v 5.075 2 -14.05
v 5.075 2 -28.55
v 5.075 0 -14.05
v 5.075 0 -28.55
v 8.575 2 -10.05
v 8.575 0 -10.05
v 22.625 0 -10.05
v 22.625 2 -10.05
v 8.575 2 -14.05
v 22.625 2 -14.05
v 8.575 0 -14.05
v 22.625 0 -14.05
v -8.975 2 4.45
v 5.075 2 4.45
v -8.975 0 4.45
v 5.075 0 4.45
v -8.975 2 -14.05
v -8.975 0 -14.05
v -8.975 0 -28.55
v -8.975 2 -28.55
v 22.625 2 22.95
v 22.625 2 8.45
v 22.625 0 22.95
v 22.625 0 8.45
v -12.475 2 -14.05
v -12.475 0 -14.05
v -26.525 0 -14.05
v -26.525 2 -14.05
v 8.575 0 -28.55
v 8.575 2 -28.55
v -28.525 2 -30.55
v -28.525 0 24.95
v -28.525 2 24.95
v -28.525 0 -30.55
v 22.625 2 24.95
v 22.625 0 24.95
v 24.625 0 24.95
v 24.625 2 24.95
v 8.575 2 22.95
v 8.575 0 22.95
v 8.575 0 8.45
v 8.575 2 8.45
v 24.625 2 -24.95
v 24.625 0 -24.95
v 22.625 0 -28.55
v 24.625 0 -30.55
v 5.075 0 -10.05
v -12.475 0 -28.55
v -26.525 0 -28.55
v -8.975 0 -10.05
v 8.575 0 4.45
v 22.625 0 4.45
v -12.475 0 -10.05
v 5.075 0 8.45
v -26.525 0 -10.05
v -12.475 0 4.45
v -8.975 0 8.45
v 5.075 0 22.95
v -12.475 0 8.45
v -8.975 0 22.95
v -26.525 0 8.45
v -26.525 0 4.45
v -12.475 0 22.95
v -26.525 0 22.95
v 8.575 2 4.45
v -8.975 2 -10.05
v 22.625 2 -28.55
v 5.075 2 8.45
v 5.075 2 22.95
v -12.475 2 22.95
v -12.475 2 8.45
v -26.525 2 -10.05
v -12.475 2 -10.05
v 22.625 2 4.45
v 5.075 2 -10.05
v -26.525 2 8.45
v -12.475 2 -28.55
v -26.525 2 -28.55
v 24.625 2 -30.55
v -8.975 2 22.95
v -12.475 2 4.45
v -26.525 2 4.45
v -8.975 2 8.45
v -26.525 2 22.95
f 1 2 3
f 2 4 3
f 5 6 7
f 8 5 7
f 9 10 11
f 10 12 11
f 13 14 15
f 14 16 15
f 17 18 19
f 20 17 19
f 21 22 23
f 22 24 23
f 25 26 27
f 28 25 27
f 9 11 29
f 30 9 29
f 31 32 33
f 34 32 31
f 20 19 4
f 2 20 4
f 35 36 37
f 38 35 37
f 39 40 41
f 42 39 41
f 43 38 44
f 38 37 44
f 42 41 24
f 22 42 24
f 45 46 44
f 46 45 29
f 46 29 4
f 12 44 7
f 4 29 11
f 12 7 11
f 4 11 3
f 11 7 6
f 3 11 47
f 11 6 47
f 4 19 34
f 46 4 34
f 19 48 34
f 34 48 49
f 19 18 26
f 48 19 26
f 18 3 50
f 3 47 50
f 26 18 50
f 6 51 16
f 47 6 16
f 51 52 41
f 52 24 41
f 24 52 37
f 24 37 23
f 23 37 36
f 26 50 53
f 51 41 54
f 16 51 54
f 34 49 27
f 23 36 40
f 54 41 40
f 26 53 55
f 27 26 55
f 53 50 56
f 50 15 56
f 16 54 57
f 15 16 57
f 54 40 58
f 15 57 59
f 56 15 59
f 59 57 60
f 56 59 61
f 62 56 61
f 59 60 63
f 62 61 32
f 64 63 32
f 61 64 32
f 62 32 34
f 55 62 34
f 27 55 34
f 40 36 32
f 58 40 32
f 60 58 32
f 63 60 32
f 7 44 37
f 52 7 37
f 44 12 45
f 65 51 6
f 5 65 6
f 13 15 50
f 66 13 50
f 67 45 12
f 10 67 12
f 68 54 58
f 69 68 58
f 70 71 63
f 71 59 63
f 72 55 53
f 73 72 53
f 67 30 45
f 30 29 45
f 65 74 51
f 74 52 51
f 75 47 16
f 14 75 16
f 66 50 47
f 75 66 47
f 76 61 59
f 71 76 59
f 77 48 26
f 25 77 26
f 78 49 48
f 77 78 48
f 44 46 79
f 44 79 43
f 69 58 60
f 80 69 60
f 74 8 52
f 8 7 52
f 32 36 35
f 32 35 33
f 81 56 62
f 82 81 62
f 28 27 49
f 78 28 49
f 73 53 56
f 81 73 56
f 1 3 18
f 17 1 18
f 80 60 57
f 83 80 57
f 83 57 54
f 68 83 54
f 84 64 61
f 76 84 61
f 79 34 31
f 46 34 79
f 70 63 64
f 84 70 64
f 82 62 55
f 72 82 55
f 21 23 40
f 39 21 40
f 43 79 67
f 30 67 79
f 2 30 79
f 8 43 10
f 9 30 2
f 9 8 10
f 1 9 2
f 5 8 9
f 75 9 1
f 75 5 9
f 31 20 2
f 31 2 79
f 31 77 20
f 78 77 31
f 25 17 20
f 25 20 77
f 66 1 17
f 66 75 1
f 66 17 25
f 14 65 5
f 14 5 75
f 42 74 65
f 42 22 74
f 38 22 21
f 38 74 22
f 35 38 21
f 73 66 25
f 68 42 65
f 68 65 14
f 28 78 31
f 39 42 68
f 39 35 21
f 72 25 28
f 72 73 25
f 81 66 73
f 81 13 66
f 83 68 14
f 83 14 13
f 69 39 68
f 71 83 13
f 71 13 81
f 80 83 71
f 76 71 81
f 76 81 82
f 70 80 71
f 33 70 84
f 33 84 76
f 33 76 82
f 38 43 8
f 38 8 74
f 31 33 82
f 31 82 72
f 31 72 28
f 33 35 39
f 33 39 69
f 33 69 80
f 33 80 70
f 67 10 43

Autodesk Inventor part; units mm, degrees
ref_plane "YZ Plane" through (0, 0, 0) normal (1, 0, 0) x (0, 1, 0)
ref_plane "XZ Plane" through (0, 0, 0) normal (0, 1, 0) x (-1, 0, 0)
ref_plane "XY Plane" through (0, 0, 0) normal (0, 0, 1) x (1, 0, 0)
sketch "Sketch1" plane through (0, 0, 0) normal (0, 1, 0) x (-1, 0, 0)
  line L0 (-24.625, 24.95) -> (-24.625, -24.95)
  line L1 (24.625, 24.95) -> (-24.625, -24.95) construction
  line L2 (-24.625, 24.95) -> (24.625, -24.95) construction
  line L3 (-24.625, 22.95) -> (-22.625, 22.95) construction
  line L4 (-22.625, 24.95) -> (-22.625, 22.95) construction
  line L5 (-22.625, 22.95) -> (-8.575, 22.95)
  line L6 (-8.575, 22.95) -> (-8.575, 8.45)
  line L7 (-8.575, 8.45) -> (-22.625, 8.45)
  line L8 (-22.625, 8.45) -> (-22.625, 22.95)
  line L9 (-22.625, 8.45) -> (-22.625, 4.45) construction
  line L10 (-22.625, 4.45) -> (-8.575, 4.45)
  line L11 (-8.575, 4.45) -> (-8.575, -10.05)
  line L12 (-8.575, -10.05) -> (-22.625, -10.05)
  line L13 (-22.625, -10.05) -> (-22.625, 4.45)
  line L14 (-22.625, -10.05) -> (-22.625, -14.05) construction
  line L15 (-22.625, -14.05) -> (-8.575, -14.05)
  line L16 (-8.575, -14.05) -> (-8.575, -28.55)
  line L17 (-8.575, -28.55) -> (-22.625, -28.55)
  line L18 (-22.625, -28.55) -> (-22.625, -14.05)
  line L19 (-8.575, 22.95) -> (-5.075, 22.95) construction
  line L20 (-5.075, 22.95) -> (8.975, 22.95)
  line L21 (8.975, 22.95) -> (8.975, 8.45)
  line L22 (8.975, 8.45) -> (-5.075, 8.45)
  line L23 (-5.075, 8.45) -> (-5.075, 22.95)
  line L24 (-5.075, 8.45) -> (-5.075, 4.45)
  line L25 (-5.075, 4.45) -> (8.975, 4.45)
  line L26 (8.975, 4.45) -> (8.975, -10.05)
  line L27 (8.975, -10.05) -> (-5.075, -10.05)
  line L28 (-5.075, -10.05) -> (-5.075, 4.45)
  line L29 (-5.075, -10.05) -> (-5.075, -14.05) construction
  line L30 (-5.075, -14.05) -> (8.975, -14.05)
  line L31 (8.975, -14.05) -> (8.975, -28.55)
  line L32 (8.975, -28.55) -> (-5.075, -28.55)
  line L33 (-5.075, -28.55) -> (-5.075, -14.05)
  line L34 (8.975, 22.95) -> (12.475, 22.95) construction
  line L35 (12.475, 22.95) -> (26.525, 22.95)
  line L36 (26.525, 22.95) -> (26.525, 8.45)
  line L37 (26.525, 8.45) -> (12.475, 8.45)
  line L38 (12.475, 8.45) -> (12.475, 22.95)
  line L39 (8.975, 4.45) -> (12.475, 4.45) construction
  line L40 (12.475, 4.45) -> (26.525, 4.45)
  line L41 (26.525, 4.45) -> (26.525, -10.05)
  line L42 (26.525, -10.05) -> (12.475, -10.05)
  line L43 (12.475, -10.05) -> (12.475, 4.45)
  line L44 (12.475, -10.05) -> (12.475, -14.05) construction
  line L45 (12.475, -14.05) -> (26.525, -14.05)
  line L46 (26.525, -14.05) -> (26.525, -28.55)
  line L47 (26.525, -28.55) -> (12.475, -28.55)
  line L48 (12.475, -28.55) -> (12.475, -14.05)
  line L49 (-22.625, 24.95) -> (-24.625, 24.95)
  line L50 (-24.625, 24.95) -> (28.525, 24.95)
  line L51 (28.525, 24.95) -> (28.525, -30.55)
  line L52 (28.525, -30.55) -> (-24.625, -30.55)
  line L53 (-24.625, -30.55) -> (-24.625, 24.95)
  point P0 (0, 0)
  dimension "d3" = 2
  dimension "d4" = 14.5
  dimension "d5" = 14.05
  dimension "d6" = 4
  dimension "d7" = 14.5
  dimension "d8" = 14.05
  dimension "d9" = 4
  dimension "d10" = 14.5
  dimension "d11" = 14.05
  dimension "d12" = 2
  dimension "d13" = 3.5
  dimension "d14" = 14.5
  dimension "d15" = 14.05
  dimension "d16" = 4
  dimension "d17" = 14.5
  dimension "d18" = 14.05
  dimension "d19" = 4
  dimension "d20" = 14.5
  dimension "d21" = 3.5
  dimension "d22" = 14.05
  dimension "d23" = 3.5
  dimension "d24" = 14.5
  dimension "d25" = 4
  dimension "d26" = 14.5
  dimension "d27" = 55.5
  dimension "d28" = 53.15
  dimension "d29" = 14.05
  dimension "d32" = 14.5
extrude "Extrusion1" add sketch "Sketch1" along normal blind 2
properties part number "Keyframe3by3"
